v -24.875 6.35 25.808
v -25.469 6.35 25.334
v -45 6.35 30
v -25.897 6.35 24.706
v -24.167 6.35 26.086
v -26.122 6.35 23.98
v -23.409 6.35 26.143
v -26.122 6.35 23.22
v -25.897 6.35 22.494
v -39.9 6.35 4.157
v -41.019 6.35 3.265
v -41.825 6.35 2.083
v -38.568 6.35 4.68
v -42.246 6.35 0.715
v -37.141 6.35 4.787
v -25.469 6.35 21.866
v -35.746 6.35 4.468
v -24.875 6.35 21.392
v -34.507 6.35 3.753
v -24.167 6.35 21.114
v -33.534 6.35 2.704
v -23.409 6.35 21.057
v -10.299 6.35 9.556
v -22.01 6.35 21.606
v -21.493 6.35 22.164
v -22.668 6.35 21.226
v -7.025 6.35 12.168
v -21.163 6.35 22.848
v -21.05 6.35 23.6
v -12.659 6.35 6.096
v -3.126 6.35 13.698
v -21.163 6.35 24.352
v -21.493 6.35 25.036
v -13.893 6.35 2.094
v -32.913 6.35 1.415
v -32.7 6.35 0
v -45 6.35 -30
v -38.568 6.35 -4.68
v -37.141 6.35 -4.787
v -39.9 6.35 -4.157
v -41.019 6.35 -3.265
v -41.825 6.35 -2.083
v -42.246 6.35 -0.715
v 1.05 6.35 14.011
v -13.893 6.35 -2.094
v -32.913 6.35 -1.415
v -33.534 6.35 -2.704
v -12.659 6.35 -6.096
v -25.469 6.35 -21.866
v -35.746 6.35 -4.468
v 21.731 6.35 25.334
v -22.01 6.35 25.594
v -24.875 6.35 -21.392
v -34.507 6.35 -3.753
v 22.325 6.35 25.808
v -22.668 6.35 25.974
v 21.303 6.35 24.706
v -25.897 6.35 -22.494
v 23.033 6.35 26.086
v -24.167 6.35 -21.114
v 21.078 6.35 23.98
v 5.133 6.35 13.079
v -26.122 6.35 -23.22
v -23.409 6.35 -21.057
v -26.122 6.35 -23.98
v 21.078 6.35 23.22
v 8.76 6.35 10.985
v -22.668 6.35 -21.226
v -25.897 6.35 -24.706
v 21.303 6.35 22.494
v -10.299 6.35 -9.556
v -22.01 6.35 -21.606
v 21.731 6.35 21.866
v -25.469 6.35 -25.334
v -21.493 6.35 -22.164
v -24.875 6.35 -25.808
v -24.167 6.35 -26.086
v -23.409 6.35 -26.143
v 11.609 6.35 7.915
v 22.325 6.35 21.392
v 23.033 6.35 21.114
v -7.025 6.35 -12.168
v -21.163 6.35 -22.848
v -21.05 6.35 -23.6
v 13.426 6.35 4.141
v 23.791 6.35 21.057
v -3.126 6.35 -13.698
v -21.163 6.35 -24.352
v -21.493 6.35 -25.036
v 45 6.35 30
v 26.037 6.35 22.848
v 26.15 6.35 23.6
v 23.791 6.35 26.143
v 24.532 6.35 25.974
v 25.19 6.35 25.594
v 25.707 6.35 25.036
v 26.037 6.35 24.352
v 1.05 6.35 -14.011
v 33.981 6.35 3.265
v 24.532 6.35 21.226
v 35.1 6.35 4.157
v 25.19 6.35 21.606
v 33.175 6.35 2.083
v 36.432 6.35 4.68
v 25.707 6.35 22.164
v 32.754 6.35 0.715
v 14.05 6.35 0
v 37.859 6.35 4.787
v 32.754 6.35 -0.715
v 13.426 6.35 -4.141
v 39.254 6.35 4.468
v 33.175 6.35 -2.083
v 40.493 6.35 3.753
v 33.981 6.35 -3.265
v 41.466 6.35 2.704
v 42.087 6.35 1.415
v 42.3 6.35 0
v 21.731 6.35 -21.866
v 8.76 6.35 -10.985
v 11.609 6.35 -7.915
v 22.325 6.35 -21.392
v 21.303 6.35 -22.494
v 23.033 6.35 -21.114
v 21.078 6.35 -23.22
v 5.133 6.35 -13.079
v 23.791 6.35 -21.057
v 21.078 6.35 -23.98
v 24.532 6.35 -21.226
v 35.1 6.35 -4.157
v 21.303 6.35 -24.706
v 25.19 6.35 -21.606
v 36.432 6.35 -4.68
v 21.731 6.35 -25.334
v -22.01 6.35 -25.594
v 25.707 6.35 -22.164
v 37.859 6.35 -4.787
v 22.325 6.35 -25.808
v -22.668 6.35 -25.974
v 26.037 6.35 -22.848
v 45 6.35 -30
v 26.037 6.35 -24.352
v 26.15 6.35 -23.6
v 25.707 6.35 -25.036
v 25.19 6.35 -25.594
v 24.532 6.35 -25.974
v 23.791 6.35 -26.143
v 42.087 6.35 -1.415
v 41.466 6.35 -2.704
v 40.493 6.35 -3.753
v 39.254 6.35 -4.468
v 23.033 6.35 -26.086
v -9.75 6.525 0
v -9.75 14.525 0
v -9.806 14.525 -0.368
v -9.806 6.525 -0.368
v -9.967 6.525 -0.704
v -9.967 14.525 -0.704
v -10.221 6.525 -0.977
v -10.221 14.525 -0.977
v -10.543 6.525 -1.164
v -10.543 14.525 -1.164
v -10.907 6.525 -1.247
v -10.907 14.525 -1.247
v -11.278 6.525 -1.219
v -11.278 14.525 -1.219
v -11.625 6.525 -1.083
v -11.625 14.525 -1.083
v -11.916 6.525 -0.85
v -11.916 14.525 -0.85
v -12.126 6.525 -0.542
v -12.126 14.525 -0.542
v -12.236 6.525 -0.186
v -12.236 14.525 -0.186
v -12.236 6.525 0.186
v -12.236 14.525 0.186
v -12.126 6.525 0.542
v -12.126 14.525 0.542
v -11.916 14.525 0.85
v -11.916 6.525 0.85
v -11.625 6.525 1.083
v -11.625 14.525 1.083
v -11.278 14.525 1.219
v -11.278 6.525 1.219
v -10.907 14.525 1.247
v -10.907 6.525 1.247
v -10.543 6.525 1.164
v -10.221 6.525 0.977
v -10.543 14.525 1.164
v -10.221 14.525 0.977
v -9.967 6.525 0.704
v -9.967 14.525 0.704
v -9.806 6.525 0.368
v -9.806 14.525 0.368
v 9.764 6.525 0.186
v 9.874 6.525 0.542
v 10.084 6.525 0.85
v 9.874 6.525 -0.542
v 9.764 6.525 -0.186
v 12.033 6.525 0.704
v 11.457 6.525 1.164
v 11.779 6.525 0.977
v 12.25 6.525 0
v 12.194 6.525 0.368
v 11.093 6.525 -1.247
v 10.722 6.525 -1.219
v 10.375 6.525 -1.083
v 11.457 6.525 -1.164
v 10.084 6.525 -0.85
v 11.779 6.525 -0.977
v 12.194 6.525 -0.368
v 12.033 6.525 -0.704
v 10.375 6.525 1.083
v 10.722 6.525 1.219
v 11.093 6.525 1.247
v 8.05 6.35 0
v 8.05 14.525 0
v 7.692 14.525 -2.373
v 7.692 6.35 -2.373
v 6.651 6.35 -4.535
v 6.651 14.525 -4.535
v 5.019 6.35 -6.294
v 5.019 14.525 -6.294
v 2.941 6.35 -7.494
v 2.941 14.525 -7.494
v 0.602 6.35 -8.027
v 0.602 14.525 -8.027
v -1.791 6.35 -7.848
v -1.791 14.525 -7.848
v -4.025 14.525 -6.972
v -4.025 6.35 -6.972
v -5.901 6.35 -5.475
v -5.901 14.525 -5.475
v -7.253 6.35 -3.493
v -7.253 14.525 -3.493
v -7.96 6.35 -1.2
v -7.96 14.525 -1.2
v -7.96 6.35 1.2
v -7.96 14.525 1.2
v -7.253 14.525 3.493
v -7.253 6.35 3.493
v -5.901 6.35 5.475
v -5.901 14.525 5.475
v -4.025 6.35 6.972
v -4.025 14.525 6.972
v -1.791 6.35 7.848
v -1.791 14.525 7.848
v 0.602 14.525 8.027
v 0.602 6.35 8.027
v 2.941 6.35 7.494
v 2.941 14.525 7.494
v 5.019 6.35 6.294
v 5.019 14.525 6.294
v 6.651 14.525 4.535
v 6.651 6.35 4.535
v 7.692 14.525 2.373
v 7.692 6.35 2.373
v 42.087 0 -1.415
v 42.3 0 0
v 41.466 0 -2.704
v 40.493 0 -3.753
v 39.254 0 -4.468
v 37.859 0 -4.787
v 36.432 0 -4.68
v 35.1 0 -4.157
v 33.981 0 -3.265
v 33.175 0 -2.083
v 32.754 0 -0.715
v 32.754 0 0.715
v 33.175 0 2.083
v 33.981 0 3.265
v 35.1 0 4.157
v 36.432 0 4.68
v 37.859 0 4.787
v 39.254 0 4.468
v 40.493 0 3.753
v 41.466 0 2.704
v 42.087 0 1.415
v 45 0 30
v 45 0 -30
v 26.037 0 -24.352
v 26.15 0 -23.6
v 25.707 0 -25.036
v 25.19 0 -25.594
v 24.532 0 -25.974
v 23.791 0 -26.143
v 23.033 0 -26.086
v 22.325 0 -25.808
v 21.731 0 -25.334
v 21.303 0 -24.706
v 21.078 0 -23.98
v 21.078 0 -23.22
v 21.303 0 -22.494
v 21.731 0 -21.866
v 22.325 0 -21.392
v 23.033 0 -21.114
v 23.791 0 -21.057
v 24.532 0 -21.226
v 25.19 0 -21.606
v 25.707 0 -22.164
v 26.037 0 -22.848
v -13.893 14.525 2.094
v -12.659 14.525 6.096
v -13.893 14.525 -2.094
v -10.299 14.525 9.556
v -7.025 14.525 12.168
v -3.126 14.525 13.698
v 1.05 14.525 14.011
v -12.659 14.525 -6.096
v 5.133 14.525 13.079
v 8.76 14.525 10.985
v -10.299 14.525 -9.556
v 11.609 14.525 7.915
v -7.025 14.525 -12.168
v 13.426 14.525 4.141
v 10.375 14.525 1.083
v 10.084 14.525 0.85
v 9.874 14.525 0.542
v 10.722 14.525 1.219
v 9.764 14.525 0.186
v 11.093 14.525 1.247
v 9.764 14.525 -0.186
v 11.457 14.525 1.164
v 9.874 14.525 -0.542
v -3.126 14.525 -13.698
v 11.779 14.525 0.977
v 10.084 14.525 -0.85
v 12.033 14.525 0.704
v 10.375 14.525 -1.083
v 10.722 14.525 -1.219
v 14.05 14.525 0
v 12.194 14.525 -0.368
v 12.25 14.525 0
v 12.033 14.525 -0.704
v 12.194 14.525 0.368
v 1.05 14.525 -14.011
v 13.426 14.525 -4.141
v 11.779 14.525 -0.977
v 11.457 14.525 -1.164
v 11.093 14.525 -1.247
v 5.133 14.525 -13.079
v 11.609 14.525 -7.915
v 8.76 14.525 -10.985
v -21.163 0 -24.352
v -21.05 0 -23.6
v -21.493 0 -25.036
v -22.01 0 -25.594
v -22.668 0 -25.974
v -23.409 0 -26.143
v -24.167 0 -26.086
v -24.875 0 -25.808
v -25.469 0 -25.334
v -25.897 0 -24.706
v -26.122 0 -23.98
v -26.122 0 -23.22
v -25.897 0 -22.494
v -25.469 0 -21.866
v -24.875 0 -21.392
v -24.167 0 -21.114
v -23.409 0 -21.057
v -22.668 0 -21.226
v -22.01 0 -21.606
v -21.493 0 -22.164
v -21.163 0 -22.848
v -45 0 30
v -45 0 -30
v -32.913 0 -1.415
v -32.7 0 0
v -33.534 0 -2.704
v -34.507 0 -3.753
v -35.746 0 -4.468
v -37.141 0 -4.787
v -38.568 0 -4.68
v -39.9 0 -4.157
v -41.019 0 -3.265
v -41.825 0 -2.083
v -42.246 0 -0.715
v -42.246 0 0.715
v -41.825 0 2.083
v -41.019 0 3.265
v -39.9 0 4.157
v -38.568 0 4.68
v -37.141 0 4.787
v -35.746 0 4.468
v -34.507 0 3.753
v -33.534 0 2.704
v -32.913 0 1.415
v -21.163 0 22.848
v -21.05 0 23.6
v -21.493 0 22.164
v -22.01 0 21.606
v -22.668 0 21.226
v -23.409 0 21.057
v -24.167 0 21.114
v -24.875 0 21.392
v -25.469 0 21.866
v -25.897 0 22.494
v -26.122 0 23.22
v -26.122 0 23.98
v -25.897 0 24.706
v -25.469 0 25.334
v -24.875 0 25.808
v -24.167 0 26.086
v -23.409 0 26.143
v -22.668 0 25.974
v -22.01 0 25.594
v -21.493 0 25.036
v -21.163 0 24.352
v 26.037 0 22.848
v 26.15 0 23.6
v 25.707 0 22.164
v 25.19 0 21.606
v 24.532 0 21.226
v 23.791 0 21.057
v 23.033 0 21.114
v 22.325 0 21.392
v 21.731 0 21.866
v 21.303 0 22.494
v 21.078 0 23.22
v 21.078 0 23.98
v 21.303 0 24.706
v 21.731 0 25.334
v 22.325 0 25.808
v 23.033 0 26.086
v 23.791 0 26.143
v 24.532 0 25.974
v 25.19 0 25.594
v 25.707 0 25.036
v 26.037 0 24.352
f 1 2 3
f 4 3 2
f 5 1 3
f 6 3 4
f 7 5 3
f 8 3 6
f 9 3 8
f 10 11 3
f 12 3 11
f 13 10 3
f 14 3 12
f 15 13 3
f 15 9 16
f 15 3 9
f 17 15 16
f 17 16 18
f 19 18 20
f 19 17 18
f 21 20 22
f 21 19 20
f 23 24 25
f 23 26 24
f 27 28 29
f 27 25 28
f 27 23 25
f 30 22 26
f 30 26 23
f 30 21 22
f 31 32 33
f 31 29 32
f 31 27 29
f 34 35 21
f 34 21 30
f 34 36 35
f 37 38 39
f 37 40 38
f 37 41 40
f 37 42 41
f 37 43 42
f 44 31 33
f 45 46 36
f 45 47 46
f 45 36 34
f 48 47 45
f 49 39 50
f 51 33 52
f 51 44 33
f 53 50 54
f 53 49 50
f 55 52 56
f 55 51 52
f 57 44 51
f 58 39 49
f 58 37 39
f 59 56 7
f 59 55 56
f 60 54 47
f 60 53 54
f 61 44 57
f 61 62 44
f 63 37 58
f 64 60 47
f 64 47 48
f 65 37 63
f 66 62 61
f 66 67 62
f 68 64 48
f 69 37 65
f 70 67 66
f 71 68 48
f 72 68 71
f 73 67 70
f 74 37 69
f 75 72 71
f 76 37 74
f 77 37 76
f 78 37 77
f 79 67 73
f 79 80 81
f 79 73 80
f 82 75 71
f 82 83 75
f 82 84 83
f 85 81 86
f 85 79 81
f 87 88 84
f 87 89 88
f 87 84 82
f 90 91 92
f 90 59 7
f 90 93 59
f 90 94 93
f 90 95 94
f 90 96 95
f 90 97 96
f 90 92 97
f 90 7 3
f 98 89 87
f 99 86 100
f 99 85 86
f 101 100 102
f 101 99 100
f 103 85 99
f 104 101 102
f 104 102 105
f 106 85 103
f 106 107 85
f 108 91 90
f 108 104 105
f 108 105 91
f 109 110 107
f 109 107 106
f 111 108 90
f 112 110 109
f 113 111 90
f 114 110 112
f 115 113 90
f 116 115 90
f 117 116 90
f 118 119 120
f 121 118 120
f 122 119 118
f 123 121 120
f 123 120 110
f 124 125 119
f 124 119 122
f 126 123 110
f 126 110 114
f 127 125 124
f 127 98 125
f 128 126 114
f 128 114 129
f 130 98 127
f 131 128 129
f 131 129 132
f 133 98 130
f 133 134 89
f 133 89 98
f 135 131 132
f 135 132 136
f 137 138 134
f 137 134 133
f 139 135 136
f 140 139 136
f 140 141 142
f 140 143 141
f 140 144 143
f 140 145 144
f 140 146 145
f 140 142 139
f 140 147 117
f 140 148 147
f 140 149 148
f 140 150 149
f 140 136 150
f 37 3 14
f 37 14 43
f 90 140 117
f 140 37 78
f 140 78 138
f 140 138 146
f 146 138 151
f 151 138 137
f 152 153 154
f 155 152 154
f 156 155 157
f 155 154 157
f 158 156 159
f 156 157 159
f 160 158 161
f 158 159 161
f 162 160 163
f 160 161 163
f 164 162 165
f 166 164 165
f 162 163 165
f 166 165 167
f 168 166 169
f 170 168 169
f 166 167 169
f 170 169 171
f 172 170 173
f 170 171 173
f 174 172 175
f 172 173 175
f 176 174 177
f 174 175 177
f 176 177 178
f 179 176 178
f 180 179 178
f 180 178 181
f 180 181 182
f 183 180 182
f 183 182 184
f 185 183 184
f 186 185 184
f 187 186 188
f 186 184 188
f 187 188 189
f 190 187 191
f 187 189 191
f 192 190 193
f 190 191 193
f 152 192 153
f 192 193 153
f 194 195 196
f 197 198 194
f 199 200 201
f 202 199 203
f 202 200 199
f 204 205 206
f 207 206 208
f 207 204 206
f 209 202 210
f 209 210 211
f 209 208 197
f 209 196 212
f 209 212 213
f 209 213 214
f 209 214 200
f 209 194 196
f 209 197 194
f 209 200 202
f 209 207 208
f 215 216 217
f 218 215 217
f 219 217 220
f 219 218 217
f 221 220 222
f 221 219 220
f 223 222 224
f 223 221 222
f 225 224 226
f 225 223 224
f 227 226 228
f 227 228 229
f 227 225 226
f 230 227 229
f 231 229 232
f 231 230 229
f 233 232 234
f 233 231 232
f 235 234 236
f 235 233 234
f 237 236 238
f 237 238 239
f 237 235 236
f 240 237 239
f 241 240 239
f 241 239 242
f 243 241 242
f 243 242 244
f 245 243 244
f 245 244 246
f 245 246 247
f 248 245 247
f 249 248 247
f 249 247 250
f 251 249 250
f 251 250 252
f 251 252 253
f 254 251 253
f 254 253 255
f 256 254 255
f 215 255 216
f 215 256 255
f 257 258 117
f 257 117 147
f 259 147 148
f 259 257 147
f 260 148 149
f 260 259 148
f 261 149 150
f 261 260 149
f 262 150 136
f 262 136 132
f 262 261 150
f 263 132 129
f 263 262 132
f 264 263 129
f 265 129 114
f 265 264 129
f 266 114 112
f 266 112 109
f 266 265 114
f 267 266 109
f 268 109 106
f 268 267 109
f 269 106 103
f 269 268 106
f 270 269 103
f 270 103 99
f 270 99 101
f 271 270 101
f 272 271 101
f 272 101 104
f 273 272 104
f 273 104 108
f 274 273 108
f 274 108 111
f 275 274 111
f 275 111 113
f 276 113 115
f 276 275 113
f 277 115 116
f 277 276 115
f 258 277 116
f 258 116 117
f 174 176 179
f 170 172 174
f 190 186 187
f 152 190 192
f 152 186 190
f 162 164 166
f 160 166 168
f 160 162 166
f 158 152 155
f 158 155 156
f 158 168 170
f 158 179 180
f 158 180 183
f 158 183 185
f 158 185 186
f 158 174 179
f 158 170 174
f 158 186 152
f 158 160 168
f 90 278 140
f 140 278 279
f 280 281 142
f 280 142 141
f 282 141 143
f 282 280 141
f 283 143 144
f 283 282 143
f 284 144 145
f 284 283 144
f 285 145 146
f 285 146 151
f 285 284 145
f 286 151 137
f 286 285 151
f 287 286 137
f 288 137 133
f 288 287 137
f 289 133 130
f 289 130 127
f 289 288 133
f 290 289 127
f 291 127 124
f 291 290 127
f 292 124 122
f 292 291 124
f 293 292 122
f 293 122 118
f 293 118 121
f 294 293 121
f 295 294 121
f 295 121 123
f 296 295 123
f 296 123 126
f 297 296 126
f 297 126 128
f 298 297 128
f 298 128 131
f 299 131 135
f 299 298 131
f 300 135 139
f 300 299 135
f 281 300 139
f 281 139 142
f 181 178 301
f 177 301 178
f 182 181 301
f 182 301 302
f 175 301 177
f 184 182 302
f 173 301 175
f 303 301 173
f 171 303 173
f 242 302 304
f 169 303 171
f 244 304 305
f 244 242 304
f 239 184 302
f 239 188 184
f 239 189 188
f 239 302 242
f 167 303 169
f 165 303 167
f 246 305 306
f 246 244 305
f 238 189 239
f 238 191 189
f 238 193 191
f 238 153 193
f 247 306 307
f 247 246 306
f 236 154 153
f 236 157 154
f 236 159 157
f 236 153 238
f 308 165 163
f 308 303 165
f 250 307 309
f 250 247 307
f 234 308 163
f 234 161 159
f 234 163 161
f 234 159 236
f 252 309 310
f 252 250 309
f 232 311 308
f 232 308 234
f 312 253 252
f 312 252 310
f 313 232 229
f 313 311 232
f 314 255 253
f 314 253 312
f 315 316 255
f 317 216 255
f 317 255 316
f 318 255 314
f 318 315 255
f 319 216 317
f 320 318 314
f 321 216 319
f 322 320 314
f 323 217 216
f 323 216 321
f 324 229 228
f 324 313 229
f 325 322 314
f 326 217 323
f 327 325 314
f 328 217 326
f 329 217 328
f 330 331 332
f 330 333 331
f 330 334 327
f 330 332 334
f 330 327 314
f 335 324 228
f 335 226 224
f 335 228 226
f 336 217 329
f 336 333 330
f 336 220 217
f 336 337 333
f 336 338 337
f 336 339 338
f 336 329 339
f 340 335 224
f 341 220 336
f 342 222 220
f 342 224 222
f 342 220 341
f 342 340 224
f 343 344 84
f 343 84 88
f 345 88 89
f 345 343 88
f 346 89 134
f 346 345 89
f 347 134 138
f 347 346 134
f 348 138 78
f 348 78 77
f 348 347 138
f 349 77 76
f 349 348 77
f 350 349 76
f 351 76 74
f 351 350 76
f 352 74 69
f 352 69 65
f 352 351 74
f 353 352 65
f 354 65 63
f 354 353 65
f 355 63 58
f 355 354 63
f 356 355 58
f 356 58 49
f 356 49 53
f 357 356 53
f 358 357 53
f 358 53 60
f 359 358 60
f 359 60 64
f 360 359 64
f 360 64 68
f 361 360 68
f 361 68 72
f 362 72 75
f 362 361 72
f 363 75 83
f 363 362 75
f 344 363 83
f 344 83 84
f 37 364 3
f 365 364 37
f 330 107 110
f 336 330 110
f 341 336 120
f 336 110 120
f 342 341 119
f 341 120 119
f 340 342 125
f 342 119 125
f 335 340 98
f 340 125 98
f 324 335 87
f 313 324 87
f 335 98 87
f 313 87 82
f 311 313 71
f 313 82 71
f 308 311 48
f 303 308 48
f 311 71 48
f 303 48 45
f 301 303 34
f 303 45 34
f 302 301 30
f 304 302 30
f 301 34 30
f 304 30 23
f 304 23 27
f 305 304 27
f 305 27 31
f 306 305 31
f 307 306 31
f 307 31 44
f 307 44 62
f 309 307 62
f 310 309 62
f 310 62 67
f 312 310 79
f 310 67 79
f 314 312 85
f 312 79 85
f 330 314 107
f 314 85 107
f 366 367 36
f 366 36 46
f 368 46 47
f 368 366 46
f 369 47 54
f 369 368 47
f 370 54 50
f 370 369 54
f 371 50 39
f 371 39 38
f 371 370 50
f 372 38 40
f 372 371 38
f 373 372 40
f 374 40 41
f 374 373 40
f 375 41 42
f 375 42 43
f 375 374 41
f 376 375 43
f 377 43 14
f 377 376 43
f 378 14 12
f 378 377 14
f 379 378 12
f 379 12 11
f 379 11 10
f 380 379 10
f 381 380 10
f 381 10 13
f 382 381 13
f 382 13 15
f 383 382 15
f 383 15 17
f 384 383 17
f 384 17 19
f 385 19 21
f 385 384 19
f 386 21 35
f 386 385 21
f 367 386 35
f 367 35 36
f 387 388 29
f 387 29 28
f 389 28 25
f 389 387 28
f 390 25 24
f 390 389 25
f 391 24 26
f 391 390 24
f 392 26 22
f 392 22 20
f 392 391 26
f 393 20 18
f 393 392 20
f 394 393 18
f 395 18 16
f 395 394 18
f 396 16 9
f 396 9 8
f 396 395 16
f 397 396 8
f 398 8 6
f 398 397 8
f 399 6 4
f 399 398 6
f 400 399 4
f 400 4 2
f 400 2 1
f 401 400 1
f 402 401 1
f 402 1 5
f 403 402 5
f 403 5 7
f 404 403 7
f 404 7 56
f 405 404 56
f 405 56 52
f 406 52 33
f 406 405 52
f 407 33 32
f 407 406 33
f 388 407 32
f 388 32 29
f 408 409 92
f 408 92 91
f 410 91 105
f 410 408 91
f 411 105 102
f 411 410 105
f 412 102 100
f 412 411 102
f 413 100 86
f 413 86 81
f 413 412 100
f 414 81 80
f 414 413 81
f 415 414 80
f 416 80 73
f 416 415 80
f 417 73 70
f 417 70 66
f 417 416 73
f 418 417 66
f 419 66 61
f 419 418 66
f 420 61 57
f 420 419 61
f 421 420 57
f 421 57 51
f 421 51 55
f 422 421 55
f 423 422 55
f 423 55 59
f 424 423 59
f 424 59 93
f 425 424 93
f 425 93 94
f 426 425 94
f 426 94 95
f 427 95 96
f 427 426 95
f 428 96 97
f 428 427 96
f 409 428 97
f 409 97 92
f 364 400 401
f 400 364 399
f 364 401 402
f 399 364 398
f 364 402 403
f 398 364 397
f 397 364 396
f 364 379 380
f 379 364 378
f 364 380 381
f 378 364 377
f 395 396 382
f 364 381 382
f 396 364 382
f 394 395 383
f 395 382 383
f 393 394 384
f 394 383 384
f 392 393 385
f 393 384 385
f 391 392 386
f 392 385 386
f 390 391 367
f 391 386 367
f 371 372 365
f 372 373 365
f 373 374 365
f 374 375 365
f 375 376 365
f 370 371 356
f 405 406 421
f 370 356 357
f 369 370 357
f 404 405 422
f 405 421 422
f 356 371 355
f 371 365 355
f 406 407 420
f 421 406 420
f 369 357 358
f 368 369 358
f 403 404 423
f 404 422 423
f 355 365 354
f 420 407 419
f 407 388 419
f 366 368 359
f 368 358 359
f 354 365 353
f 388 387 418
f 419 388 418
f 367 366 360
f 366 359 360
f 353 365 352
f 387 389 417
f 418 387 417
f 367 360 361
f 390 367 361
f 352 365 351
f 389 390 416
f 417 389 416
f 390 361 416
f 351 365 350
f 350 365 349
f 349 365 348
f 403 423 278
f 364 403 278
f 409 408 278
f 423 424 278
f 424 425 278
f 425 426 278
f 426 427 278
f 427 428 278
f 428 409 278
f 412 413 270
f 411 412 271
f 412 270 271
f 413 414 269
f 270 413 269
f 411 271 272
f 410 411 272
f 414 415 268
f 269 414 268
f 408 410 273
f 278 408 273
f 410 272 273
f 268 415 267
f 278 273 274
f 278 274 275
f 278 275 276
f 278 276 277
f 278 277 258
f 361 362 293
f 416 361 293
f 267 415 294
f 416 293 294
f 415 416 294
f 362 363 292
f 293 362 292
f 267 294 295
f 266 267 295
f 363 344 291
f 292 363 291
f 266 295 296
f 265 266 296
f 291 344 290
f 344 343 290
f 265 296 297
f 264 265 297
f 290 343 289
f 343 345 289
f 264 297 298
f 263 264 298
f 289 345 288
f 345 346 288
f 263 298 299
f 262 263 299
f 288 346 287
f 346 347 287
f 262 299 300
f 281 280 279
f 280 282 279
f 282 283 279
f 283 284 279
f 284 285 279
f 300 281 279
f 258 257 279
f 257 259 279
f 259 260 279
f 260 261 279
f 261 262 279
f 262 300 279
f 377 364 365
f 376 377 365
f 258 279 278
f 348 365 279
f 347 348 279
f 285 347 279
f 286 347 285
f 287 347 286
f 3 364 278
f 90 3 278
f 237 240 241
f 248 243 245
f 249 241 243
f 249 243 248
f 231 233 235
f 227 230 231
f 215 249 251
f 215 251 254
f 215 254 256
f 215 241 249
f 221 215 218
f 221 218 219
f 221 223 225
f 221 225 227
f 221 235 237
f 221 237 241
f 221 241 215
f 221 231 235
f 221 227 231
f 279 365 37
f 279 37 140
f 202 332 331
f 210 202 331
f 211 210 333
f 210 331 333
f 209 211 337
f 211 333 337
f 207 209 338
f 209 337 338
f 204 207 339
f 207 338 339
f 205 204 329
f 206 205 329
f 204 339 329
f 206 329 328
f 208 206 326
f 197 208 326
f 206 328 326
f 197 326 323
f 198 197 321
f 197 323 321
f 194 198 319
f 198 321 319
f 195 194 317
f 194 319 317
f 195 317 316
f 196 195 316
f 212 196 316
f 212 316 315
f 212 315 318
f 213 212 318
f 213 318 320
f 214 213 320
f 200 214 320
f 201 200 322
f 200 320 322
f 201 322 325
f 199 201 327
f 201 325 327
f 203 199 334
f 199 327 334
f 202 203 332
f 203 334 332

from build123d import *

# Parameters (mm, degrees)
SKETCH1_W           = 90
SKETCH1_H           = 60
SKETCH1_R           = 4.8
SKETCH1_R_2         = 2.55
BOSS_EXTRUDE1_DEPTH = 6.35
SKETCH2_R           = 14.05
SKETCH2_R_2         = 8.05
BOSS_EXTRUDE2_DEPTH = 8.175
SKETCH3_R           = 1.25
CUT_EXTRUDE1_DEPTH  = 8


with BuildPart() as part:
    # Sketch1 → Boss-Extrude1 (new body)
    with BuildSketch(Plane(origin=(0, 0, 0), x_dir=(1, 0, 0), z_dir=(0, 1, 0))):
        Rectangle(SKETCH1_W, SKETCH1_H)
        with Locations((-37.5, 0)):
            Circle(SKETCH1_R, mode=Mode.SUBTRACT)
        with Locations((37.5, 0)):
            Circle(SKETCH1_R, mode=Mode.SUBTRACT)
        with Locations((-23.6, -23.6)):
            Circle(SKETCH1_R_2, mode=Mode.SUBTRACT)
        with Locations((23.6, -23.6)):
            Circle(SKETCH1_R_2, mode=Mode.SUBTRACT)
        with Locations((23.6, 23.6)):
            Circle(SKETCH1_R_2, mode=Mode.SUBTRACT)
        with Locations((-23.6, 23.6)):
            Circle(SKETCH1_R_2, mode=Mode.SUBTRACT)
    extrude(amount=BOSS_EXTRUDE1_DEPTH)

    # Sketch2 → Boss-Extrude2 (add)
    with BuildSketch(Plane(origin=(0, 6.35, 0), x_dir=(1, 0, 0), z_dir=(0, 1, 0))):
        Circle(SKETCH2_R)
        Circle(SKETCH2_R_2, mode=Mode.SUBTRACT)
    extrude(amount=BOSS_EXTRUDE2_DEPTH)

    # Sketch3 → Cut-Extrude1 (cut)
    with BuildSketch(Plane(origin=(0, 14.525, 0), x_dir=(1, 0, 0), z_dir=(0, 1, 0))):
        with Locations((-11, 0)):
            Circle(SKETCH3_R)
        with Locations((11, 0)):
            Circle(SKETCH3_R)
    extrude(amount=-CUT_EXTRUDE1_DEPTH, mode=Mode.SUBTRACT)


solid = part.part
